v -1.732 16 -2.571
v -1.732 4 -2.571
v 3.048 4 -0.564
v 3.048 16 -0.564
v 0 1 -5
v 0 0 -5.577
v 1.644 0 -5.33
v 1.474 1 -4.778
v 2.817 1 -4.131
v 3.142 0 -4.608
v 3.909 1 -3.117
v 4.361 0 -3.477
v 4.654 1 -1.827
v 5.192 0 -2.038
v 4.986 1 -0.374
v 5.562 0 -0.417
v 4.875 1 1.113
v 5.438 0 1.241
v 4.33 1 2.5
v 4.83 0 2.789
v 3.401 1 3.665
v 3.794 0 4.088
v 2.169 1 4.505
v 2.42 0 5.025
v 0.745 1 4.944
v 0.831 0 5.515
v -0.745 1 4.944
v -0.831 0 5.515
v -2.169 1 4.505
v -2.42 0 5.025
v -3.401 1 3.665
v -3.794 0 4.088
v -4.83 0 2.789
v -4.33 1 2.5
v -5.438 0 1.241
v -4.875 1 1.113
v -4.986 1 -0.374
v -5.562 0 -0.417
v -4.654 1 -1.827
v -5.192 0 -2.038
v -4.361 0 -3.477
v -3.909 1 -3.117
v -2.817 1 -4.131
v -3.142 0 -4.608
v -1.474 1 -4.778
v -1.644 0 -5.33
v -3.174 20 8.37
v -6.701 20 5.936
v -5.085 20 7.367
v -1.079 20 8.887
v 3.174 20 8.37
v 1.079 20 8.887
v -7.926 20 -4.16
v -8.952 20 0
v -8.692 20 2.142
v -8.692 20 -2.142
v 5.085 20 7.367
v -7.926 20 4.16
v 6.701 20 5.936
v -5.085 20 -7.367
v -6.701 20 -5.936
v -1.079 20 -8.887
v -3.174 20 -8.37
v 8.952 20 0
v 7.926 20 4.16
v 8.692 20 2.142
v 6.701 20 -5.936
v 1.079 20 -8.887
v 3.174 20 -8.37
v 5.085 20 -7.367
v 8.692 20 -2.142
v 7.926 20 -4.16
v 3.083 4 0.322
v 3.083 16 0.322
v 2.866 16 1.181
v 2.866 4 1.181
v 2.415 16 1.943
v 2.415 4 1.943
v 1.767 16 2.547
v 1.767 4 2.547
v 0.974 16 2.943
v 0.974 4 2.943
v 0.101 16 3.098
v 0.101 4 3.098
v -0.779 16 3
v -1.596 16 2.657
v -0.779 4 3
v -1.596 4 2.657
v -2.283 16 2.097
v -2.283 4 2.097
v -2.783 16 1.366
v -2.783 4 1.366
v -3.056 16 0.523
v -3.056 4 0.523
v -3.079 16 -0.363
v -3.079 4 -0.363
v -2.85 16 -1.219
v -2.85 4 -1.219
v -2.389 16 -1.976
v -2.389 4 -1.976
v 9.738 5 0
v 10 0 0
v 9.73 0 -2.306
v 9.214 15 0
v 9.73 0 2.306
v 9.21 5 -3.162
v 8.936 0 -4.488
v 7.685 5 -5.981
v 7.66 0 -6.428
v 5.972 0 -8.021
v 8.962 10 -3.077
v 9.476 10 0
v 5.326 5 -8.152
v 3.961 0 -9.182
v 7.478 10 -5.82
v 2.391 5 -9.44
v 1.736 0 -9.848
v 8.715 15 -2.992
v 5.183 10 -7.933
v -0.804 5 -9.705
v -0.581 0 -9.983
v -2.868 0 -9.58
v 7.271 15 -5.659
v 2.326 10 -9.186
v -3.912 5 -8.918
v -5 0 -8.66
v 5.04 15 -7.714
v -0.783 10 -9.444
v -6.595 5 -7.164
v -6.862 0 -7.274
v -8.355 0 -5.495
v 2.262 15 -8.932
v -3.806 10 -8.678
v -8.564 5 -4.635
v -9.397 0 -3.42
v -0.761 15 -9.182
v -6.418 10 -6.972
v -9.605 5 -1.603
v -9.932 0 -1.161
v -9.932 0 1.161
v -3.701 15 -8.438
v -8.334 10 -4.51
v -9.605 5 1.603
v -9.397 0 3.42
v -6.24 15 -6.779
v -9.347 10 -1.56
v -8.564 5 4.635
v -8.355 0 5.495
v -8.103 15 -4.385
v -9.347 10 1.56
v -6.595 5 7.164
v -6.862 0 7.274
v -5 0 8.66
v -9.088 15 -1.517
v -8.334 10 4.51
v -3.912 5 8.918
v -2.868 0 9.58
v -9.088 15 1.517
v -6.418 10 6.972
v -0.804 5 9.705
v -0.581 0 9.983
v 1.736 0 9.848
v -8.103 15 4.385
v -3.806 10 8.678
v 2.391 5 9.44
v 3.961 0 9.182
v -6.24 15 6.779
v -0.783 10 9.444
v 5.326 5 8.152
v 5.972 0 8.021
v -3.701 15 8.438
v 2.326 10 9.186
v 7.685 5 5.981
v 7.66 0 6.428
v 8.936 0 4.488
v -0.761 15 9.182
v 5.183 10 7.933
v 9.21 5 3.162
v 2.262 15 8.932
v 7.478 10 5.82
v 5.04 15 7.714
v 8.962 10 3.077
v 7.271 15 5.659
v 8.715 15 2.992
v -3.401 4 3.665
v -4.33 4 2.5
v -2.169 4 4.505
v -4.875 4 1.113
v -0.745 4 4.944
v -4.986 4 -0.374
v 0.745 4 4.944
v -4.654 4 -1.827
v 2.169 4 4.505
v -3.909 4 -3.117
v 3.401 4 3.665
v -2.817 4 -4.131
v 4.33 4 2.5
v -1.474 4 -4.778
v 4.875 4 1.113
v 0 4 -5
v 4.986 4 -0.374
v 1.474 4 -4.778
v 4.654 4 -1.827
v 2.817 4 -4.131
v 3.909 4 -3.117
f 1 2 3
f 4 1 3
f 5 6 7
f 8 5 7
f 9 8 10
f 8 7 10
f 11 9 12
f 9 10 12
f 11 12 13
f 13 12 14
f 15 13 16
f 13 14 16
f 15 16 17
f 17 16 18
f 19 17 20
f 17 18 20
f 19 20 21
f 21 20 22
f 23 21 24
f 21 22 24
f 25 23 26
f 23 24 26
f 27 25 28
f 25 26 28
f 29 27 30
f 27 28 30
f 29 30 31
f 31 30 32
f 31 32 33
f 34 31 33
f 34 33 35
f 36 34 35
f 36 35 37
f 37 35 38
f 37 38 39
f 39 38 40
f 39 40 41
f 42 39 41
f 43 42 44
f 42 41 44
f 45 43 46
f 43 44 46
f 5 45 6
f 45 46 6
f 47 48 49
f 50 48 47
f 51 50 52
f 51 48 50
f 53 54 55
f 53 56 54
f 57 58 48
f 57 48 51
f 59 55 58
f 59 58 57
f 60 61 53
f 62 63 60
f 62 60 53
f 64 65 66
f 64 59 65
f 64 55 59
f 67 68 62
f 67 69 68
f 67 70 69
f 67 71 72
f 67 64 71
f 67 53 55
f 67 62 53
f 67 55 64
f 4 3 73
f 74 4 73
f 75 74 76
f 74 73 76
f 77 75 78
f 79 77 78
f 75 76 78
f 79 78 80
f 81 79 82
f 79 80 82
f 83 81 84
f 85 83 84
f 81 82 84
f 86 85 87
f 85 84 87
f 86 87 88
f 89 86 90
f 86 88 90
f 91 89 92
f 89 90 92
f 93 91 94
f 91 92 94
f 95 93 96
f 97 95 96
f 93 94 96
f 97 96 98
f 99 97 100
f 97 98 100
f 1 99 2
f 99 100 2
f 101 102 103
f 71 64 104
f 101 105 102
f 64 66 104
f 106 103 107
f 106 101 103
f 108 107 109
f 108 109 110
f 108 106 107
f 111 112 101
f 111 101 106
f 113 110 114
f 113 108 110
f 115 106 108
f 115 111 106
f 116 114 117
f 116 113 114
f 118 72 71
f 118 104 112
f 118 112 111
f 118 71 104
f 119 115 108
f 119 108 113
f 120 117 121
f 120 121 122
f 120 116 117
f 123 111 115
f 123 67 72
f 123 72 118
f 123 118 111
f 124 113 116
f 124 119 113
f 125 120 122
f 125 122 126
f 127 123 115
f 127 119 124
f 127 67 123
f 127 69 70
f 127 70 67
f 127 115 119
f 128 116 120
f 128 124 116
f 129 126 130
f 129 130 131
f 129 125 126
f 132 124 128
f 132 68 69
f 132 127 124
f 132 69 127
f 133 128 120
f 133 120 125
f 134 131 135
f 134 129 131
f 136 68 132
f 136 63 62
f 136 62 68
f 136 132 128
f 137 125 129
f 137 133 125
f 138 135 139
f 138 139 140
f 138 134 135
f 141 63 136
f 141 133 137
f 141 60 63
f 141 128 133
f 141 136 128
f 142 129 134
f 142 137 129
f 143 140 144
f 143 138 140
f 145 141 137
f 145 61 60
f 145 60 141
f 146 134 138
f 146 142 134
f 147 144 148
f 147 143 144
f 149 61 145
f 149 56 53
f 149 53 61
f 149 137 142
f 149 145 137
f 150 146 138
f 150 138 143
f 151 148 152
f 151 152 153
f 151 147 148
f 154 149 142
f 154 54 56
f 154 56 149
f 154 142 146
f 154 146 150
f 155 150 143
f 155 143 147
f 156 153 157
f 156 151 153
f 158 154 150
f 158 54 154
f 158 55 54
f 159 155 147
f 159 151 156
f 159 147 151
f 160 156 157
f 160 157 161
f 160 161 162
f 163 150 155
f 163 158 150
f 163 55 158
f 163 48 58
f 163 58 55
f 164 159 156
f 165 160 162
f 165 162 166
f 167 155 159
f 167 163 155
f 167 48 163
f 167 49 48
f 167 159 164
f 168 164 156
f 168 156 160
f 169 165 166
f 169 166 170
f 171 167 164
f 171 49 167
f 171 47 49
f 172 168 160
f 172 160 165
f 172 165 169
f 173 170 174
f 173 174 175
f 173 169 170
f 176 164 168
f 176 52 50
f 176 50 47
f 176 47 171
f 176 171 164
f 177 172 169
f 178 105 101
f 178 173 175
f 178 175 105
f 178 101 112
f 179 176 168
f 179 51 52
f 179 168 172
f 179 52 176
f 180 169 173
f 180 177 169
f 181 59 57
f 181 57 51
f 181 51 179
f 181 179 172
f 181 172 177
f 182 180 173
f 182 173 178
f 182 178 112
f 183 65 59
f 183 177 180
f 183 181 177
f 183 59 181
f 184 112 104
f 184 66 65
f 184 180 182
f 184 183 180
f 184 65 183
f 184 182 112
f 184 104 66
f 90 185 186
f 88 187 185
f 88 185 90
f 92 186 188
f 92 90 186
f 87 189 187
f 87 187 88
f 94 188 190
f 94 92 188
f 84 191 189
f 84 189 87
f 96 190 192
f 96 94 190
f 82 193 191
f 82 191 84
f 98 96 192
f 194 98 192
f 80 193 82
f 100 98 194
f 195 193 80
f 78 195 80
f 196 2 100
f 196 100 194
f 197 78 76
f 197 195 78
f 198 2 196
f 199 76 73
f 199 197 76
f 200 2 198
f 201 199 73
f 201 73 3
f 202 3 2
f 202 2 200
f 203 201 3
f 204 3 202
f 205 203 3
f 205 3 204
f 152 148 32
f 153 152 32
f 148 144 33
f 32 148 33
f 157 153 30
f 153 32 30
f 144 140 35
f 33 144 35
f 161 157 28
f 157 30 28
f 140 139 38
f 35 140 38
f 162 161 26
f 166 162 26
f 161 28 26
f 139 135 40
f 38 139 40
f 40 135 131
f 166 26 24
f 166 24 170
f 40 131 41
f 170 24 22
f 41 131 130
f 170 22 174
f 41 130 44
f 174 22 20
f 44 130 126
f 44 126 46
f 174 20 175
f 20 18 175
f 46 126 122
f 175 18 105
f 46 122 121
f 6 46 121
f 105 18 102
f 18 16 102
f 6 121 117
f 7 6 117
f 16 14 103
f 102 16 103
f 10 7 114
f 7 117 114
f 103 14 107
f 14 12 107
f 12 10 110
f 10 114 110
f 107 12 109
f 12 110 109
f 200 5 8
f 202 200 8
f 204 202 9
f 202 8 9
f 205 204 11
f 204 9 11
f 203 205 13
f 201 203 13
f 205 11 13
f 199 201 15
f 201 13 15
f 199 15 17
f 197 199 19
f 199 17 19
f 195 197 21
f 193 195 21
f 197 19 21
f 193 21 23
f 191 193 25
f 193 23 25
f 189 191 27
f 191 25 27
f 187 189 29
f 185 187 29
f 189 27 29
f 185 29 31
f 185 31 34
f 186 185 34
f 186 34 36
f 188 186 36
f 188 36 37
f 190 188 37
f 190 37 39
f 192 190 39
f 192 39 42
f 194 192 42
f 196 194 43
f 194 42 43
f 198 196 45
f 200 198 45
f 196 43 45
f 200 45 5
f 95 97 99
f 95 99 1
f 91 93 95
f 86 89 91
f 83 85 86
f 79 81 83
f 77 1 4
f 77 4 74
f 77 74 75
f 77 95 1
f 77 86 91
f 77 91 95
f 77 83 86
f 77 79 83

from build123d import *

# Parameters (mm, degrees)
SKETCH1_R           = 10
BOSS_EXTRUDE1_DEPTH = 20
BOSS_EXTRUDE1_TAPER = 3
SKETCH2_R           = 5
CUT_EXTRUDE1_DEPTH  = 4
CUT_EXTRUDE2_DEPTH  = 12
CHAMFER1_SIZE       = 1
CHAMFER1_SIZE2      = 0.577350269


with BuildPart() as part:
    # Sketch1 → Boss-Extrude1 (new body)
    with BuildSketch(Plane(origin=(0, 0, 0), x_dir=(1, 0, 0), z_dir=(0, 1, 0))):
        Circle(SKETCH1_R)
    extrude(amount=BOSS_EXTRUDE1_DEPTH, taper=BOSS_EXTRUDE1_TAPER)

    # Sketch2 → Cut-Extrude1 (cut)
    with BuildSketch(Plane.XZ):
        with Locations(Location((0, 0, 0), (0, 0, 270))):
            Circle(SKETCH2_R)
    extrude(amount=-CUT_EXTRUDE1_DEPTH, mode=Mode.SUBTRACT)

    # Sketch3 → Cut-Extrude2 (cut)
    with BuildSketch(Plane.XZ.offset(-4)):
        with BuildLine():
            Line((-1.732055507, -2.57098886), (3.04828024, -0.563903873))
            ThreePointArc((3.04828024, -0.563903873), (-1.200087257, 2.858284551), (-1.732055507, -2.57098886))
        make_face()
    extrude(amount=-CUT_EXTRUDE2_DEPTH, mode=Mode.SUBTRACT)

    # Chamfer1
    chamfer1_edges = [part.edges().sort_by_distance(p)[0] for p in [
        (0, 0, 5),
    ]]
    chamfer1_side = [part.faces().sort_by_distance(p)[0] for p in [
        (0, 2, 5),
    ]]
    chamfer(chamfer1_edges, length=CHAMFER1_SIZE, length2=CHAMFER1_SIZE2, reference=chamfer1_side[0])


solid = part.part
